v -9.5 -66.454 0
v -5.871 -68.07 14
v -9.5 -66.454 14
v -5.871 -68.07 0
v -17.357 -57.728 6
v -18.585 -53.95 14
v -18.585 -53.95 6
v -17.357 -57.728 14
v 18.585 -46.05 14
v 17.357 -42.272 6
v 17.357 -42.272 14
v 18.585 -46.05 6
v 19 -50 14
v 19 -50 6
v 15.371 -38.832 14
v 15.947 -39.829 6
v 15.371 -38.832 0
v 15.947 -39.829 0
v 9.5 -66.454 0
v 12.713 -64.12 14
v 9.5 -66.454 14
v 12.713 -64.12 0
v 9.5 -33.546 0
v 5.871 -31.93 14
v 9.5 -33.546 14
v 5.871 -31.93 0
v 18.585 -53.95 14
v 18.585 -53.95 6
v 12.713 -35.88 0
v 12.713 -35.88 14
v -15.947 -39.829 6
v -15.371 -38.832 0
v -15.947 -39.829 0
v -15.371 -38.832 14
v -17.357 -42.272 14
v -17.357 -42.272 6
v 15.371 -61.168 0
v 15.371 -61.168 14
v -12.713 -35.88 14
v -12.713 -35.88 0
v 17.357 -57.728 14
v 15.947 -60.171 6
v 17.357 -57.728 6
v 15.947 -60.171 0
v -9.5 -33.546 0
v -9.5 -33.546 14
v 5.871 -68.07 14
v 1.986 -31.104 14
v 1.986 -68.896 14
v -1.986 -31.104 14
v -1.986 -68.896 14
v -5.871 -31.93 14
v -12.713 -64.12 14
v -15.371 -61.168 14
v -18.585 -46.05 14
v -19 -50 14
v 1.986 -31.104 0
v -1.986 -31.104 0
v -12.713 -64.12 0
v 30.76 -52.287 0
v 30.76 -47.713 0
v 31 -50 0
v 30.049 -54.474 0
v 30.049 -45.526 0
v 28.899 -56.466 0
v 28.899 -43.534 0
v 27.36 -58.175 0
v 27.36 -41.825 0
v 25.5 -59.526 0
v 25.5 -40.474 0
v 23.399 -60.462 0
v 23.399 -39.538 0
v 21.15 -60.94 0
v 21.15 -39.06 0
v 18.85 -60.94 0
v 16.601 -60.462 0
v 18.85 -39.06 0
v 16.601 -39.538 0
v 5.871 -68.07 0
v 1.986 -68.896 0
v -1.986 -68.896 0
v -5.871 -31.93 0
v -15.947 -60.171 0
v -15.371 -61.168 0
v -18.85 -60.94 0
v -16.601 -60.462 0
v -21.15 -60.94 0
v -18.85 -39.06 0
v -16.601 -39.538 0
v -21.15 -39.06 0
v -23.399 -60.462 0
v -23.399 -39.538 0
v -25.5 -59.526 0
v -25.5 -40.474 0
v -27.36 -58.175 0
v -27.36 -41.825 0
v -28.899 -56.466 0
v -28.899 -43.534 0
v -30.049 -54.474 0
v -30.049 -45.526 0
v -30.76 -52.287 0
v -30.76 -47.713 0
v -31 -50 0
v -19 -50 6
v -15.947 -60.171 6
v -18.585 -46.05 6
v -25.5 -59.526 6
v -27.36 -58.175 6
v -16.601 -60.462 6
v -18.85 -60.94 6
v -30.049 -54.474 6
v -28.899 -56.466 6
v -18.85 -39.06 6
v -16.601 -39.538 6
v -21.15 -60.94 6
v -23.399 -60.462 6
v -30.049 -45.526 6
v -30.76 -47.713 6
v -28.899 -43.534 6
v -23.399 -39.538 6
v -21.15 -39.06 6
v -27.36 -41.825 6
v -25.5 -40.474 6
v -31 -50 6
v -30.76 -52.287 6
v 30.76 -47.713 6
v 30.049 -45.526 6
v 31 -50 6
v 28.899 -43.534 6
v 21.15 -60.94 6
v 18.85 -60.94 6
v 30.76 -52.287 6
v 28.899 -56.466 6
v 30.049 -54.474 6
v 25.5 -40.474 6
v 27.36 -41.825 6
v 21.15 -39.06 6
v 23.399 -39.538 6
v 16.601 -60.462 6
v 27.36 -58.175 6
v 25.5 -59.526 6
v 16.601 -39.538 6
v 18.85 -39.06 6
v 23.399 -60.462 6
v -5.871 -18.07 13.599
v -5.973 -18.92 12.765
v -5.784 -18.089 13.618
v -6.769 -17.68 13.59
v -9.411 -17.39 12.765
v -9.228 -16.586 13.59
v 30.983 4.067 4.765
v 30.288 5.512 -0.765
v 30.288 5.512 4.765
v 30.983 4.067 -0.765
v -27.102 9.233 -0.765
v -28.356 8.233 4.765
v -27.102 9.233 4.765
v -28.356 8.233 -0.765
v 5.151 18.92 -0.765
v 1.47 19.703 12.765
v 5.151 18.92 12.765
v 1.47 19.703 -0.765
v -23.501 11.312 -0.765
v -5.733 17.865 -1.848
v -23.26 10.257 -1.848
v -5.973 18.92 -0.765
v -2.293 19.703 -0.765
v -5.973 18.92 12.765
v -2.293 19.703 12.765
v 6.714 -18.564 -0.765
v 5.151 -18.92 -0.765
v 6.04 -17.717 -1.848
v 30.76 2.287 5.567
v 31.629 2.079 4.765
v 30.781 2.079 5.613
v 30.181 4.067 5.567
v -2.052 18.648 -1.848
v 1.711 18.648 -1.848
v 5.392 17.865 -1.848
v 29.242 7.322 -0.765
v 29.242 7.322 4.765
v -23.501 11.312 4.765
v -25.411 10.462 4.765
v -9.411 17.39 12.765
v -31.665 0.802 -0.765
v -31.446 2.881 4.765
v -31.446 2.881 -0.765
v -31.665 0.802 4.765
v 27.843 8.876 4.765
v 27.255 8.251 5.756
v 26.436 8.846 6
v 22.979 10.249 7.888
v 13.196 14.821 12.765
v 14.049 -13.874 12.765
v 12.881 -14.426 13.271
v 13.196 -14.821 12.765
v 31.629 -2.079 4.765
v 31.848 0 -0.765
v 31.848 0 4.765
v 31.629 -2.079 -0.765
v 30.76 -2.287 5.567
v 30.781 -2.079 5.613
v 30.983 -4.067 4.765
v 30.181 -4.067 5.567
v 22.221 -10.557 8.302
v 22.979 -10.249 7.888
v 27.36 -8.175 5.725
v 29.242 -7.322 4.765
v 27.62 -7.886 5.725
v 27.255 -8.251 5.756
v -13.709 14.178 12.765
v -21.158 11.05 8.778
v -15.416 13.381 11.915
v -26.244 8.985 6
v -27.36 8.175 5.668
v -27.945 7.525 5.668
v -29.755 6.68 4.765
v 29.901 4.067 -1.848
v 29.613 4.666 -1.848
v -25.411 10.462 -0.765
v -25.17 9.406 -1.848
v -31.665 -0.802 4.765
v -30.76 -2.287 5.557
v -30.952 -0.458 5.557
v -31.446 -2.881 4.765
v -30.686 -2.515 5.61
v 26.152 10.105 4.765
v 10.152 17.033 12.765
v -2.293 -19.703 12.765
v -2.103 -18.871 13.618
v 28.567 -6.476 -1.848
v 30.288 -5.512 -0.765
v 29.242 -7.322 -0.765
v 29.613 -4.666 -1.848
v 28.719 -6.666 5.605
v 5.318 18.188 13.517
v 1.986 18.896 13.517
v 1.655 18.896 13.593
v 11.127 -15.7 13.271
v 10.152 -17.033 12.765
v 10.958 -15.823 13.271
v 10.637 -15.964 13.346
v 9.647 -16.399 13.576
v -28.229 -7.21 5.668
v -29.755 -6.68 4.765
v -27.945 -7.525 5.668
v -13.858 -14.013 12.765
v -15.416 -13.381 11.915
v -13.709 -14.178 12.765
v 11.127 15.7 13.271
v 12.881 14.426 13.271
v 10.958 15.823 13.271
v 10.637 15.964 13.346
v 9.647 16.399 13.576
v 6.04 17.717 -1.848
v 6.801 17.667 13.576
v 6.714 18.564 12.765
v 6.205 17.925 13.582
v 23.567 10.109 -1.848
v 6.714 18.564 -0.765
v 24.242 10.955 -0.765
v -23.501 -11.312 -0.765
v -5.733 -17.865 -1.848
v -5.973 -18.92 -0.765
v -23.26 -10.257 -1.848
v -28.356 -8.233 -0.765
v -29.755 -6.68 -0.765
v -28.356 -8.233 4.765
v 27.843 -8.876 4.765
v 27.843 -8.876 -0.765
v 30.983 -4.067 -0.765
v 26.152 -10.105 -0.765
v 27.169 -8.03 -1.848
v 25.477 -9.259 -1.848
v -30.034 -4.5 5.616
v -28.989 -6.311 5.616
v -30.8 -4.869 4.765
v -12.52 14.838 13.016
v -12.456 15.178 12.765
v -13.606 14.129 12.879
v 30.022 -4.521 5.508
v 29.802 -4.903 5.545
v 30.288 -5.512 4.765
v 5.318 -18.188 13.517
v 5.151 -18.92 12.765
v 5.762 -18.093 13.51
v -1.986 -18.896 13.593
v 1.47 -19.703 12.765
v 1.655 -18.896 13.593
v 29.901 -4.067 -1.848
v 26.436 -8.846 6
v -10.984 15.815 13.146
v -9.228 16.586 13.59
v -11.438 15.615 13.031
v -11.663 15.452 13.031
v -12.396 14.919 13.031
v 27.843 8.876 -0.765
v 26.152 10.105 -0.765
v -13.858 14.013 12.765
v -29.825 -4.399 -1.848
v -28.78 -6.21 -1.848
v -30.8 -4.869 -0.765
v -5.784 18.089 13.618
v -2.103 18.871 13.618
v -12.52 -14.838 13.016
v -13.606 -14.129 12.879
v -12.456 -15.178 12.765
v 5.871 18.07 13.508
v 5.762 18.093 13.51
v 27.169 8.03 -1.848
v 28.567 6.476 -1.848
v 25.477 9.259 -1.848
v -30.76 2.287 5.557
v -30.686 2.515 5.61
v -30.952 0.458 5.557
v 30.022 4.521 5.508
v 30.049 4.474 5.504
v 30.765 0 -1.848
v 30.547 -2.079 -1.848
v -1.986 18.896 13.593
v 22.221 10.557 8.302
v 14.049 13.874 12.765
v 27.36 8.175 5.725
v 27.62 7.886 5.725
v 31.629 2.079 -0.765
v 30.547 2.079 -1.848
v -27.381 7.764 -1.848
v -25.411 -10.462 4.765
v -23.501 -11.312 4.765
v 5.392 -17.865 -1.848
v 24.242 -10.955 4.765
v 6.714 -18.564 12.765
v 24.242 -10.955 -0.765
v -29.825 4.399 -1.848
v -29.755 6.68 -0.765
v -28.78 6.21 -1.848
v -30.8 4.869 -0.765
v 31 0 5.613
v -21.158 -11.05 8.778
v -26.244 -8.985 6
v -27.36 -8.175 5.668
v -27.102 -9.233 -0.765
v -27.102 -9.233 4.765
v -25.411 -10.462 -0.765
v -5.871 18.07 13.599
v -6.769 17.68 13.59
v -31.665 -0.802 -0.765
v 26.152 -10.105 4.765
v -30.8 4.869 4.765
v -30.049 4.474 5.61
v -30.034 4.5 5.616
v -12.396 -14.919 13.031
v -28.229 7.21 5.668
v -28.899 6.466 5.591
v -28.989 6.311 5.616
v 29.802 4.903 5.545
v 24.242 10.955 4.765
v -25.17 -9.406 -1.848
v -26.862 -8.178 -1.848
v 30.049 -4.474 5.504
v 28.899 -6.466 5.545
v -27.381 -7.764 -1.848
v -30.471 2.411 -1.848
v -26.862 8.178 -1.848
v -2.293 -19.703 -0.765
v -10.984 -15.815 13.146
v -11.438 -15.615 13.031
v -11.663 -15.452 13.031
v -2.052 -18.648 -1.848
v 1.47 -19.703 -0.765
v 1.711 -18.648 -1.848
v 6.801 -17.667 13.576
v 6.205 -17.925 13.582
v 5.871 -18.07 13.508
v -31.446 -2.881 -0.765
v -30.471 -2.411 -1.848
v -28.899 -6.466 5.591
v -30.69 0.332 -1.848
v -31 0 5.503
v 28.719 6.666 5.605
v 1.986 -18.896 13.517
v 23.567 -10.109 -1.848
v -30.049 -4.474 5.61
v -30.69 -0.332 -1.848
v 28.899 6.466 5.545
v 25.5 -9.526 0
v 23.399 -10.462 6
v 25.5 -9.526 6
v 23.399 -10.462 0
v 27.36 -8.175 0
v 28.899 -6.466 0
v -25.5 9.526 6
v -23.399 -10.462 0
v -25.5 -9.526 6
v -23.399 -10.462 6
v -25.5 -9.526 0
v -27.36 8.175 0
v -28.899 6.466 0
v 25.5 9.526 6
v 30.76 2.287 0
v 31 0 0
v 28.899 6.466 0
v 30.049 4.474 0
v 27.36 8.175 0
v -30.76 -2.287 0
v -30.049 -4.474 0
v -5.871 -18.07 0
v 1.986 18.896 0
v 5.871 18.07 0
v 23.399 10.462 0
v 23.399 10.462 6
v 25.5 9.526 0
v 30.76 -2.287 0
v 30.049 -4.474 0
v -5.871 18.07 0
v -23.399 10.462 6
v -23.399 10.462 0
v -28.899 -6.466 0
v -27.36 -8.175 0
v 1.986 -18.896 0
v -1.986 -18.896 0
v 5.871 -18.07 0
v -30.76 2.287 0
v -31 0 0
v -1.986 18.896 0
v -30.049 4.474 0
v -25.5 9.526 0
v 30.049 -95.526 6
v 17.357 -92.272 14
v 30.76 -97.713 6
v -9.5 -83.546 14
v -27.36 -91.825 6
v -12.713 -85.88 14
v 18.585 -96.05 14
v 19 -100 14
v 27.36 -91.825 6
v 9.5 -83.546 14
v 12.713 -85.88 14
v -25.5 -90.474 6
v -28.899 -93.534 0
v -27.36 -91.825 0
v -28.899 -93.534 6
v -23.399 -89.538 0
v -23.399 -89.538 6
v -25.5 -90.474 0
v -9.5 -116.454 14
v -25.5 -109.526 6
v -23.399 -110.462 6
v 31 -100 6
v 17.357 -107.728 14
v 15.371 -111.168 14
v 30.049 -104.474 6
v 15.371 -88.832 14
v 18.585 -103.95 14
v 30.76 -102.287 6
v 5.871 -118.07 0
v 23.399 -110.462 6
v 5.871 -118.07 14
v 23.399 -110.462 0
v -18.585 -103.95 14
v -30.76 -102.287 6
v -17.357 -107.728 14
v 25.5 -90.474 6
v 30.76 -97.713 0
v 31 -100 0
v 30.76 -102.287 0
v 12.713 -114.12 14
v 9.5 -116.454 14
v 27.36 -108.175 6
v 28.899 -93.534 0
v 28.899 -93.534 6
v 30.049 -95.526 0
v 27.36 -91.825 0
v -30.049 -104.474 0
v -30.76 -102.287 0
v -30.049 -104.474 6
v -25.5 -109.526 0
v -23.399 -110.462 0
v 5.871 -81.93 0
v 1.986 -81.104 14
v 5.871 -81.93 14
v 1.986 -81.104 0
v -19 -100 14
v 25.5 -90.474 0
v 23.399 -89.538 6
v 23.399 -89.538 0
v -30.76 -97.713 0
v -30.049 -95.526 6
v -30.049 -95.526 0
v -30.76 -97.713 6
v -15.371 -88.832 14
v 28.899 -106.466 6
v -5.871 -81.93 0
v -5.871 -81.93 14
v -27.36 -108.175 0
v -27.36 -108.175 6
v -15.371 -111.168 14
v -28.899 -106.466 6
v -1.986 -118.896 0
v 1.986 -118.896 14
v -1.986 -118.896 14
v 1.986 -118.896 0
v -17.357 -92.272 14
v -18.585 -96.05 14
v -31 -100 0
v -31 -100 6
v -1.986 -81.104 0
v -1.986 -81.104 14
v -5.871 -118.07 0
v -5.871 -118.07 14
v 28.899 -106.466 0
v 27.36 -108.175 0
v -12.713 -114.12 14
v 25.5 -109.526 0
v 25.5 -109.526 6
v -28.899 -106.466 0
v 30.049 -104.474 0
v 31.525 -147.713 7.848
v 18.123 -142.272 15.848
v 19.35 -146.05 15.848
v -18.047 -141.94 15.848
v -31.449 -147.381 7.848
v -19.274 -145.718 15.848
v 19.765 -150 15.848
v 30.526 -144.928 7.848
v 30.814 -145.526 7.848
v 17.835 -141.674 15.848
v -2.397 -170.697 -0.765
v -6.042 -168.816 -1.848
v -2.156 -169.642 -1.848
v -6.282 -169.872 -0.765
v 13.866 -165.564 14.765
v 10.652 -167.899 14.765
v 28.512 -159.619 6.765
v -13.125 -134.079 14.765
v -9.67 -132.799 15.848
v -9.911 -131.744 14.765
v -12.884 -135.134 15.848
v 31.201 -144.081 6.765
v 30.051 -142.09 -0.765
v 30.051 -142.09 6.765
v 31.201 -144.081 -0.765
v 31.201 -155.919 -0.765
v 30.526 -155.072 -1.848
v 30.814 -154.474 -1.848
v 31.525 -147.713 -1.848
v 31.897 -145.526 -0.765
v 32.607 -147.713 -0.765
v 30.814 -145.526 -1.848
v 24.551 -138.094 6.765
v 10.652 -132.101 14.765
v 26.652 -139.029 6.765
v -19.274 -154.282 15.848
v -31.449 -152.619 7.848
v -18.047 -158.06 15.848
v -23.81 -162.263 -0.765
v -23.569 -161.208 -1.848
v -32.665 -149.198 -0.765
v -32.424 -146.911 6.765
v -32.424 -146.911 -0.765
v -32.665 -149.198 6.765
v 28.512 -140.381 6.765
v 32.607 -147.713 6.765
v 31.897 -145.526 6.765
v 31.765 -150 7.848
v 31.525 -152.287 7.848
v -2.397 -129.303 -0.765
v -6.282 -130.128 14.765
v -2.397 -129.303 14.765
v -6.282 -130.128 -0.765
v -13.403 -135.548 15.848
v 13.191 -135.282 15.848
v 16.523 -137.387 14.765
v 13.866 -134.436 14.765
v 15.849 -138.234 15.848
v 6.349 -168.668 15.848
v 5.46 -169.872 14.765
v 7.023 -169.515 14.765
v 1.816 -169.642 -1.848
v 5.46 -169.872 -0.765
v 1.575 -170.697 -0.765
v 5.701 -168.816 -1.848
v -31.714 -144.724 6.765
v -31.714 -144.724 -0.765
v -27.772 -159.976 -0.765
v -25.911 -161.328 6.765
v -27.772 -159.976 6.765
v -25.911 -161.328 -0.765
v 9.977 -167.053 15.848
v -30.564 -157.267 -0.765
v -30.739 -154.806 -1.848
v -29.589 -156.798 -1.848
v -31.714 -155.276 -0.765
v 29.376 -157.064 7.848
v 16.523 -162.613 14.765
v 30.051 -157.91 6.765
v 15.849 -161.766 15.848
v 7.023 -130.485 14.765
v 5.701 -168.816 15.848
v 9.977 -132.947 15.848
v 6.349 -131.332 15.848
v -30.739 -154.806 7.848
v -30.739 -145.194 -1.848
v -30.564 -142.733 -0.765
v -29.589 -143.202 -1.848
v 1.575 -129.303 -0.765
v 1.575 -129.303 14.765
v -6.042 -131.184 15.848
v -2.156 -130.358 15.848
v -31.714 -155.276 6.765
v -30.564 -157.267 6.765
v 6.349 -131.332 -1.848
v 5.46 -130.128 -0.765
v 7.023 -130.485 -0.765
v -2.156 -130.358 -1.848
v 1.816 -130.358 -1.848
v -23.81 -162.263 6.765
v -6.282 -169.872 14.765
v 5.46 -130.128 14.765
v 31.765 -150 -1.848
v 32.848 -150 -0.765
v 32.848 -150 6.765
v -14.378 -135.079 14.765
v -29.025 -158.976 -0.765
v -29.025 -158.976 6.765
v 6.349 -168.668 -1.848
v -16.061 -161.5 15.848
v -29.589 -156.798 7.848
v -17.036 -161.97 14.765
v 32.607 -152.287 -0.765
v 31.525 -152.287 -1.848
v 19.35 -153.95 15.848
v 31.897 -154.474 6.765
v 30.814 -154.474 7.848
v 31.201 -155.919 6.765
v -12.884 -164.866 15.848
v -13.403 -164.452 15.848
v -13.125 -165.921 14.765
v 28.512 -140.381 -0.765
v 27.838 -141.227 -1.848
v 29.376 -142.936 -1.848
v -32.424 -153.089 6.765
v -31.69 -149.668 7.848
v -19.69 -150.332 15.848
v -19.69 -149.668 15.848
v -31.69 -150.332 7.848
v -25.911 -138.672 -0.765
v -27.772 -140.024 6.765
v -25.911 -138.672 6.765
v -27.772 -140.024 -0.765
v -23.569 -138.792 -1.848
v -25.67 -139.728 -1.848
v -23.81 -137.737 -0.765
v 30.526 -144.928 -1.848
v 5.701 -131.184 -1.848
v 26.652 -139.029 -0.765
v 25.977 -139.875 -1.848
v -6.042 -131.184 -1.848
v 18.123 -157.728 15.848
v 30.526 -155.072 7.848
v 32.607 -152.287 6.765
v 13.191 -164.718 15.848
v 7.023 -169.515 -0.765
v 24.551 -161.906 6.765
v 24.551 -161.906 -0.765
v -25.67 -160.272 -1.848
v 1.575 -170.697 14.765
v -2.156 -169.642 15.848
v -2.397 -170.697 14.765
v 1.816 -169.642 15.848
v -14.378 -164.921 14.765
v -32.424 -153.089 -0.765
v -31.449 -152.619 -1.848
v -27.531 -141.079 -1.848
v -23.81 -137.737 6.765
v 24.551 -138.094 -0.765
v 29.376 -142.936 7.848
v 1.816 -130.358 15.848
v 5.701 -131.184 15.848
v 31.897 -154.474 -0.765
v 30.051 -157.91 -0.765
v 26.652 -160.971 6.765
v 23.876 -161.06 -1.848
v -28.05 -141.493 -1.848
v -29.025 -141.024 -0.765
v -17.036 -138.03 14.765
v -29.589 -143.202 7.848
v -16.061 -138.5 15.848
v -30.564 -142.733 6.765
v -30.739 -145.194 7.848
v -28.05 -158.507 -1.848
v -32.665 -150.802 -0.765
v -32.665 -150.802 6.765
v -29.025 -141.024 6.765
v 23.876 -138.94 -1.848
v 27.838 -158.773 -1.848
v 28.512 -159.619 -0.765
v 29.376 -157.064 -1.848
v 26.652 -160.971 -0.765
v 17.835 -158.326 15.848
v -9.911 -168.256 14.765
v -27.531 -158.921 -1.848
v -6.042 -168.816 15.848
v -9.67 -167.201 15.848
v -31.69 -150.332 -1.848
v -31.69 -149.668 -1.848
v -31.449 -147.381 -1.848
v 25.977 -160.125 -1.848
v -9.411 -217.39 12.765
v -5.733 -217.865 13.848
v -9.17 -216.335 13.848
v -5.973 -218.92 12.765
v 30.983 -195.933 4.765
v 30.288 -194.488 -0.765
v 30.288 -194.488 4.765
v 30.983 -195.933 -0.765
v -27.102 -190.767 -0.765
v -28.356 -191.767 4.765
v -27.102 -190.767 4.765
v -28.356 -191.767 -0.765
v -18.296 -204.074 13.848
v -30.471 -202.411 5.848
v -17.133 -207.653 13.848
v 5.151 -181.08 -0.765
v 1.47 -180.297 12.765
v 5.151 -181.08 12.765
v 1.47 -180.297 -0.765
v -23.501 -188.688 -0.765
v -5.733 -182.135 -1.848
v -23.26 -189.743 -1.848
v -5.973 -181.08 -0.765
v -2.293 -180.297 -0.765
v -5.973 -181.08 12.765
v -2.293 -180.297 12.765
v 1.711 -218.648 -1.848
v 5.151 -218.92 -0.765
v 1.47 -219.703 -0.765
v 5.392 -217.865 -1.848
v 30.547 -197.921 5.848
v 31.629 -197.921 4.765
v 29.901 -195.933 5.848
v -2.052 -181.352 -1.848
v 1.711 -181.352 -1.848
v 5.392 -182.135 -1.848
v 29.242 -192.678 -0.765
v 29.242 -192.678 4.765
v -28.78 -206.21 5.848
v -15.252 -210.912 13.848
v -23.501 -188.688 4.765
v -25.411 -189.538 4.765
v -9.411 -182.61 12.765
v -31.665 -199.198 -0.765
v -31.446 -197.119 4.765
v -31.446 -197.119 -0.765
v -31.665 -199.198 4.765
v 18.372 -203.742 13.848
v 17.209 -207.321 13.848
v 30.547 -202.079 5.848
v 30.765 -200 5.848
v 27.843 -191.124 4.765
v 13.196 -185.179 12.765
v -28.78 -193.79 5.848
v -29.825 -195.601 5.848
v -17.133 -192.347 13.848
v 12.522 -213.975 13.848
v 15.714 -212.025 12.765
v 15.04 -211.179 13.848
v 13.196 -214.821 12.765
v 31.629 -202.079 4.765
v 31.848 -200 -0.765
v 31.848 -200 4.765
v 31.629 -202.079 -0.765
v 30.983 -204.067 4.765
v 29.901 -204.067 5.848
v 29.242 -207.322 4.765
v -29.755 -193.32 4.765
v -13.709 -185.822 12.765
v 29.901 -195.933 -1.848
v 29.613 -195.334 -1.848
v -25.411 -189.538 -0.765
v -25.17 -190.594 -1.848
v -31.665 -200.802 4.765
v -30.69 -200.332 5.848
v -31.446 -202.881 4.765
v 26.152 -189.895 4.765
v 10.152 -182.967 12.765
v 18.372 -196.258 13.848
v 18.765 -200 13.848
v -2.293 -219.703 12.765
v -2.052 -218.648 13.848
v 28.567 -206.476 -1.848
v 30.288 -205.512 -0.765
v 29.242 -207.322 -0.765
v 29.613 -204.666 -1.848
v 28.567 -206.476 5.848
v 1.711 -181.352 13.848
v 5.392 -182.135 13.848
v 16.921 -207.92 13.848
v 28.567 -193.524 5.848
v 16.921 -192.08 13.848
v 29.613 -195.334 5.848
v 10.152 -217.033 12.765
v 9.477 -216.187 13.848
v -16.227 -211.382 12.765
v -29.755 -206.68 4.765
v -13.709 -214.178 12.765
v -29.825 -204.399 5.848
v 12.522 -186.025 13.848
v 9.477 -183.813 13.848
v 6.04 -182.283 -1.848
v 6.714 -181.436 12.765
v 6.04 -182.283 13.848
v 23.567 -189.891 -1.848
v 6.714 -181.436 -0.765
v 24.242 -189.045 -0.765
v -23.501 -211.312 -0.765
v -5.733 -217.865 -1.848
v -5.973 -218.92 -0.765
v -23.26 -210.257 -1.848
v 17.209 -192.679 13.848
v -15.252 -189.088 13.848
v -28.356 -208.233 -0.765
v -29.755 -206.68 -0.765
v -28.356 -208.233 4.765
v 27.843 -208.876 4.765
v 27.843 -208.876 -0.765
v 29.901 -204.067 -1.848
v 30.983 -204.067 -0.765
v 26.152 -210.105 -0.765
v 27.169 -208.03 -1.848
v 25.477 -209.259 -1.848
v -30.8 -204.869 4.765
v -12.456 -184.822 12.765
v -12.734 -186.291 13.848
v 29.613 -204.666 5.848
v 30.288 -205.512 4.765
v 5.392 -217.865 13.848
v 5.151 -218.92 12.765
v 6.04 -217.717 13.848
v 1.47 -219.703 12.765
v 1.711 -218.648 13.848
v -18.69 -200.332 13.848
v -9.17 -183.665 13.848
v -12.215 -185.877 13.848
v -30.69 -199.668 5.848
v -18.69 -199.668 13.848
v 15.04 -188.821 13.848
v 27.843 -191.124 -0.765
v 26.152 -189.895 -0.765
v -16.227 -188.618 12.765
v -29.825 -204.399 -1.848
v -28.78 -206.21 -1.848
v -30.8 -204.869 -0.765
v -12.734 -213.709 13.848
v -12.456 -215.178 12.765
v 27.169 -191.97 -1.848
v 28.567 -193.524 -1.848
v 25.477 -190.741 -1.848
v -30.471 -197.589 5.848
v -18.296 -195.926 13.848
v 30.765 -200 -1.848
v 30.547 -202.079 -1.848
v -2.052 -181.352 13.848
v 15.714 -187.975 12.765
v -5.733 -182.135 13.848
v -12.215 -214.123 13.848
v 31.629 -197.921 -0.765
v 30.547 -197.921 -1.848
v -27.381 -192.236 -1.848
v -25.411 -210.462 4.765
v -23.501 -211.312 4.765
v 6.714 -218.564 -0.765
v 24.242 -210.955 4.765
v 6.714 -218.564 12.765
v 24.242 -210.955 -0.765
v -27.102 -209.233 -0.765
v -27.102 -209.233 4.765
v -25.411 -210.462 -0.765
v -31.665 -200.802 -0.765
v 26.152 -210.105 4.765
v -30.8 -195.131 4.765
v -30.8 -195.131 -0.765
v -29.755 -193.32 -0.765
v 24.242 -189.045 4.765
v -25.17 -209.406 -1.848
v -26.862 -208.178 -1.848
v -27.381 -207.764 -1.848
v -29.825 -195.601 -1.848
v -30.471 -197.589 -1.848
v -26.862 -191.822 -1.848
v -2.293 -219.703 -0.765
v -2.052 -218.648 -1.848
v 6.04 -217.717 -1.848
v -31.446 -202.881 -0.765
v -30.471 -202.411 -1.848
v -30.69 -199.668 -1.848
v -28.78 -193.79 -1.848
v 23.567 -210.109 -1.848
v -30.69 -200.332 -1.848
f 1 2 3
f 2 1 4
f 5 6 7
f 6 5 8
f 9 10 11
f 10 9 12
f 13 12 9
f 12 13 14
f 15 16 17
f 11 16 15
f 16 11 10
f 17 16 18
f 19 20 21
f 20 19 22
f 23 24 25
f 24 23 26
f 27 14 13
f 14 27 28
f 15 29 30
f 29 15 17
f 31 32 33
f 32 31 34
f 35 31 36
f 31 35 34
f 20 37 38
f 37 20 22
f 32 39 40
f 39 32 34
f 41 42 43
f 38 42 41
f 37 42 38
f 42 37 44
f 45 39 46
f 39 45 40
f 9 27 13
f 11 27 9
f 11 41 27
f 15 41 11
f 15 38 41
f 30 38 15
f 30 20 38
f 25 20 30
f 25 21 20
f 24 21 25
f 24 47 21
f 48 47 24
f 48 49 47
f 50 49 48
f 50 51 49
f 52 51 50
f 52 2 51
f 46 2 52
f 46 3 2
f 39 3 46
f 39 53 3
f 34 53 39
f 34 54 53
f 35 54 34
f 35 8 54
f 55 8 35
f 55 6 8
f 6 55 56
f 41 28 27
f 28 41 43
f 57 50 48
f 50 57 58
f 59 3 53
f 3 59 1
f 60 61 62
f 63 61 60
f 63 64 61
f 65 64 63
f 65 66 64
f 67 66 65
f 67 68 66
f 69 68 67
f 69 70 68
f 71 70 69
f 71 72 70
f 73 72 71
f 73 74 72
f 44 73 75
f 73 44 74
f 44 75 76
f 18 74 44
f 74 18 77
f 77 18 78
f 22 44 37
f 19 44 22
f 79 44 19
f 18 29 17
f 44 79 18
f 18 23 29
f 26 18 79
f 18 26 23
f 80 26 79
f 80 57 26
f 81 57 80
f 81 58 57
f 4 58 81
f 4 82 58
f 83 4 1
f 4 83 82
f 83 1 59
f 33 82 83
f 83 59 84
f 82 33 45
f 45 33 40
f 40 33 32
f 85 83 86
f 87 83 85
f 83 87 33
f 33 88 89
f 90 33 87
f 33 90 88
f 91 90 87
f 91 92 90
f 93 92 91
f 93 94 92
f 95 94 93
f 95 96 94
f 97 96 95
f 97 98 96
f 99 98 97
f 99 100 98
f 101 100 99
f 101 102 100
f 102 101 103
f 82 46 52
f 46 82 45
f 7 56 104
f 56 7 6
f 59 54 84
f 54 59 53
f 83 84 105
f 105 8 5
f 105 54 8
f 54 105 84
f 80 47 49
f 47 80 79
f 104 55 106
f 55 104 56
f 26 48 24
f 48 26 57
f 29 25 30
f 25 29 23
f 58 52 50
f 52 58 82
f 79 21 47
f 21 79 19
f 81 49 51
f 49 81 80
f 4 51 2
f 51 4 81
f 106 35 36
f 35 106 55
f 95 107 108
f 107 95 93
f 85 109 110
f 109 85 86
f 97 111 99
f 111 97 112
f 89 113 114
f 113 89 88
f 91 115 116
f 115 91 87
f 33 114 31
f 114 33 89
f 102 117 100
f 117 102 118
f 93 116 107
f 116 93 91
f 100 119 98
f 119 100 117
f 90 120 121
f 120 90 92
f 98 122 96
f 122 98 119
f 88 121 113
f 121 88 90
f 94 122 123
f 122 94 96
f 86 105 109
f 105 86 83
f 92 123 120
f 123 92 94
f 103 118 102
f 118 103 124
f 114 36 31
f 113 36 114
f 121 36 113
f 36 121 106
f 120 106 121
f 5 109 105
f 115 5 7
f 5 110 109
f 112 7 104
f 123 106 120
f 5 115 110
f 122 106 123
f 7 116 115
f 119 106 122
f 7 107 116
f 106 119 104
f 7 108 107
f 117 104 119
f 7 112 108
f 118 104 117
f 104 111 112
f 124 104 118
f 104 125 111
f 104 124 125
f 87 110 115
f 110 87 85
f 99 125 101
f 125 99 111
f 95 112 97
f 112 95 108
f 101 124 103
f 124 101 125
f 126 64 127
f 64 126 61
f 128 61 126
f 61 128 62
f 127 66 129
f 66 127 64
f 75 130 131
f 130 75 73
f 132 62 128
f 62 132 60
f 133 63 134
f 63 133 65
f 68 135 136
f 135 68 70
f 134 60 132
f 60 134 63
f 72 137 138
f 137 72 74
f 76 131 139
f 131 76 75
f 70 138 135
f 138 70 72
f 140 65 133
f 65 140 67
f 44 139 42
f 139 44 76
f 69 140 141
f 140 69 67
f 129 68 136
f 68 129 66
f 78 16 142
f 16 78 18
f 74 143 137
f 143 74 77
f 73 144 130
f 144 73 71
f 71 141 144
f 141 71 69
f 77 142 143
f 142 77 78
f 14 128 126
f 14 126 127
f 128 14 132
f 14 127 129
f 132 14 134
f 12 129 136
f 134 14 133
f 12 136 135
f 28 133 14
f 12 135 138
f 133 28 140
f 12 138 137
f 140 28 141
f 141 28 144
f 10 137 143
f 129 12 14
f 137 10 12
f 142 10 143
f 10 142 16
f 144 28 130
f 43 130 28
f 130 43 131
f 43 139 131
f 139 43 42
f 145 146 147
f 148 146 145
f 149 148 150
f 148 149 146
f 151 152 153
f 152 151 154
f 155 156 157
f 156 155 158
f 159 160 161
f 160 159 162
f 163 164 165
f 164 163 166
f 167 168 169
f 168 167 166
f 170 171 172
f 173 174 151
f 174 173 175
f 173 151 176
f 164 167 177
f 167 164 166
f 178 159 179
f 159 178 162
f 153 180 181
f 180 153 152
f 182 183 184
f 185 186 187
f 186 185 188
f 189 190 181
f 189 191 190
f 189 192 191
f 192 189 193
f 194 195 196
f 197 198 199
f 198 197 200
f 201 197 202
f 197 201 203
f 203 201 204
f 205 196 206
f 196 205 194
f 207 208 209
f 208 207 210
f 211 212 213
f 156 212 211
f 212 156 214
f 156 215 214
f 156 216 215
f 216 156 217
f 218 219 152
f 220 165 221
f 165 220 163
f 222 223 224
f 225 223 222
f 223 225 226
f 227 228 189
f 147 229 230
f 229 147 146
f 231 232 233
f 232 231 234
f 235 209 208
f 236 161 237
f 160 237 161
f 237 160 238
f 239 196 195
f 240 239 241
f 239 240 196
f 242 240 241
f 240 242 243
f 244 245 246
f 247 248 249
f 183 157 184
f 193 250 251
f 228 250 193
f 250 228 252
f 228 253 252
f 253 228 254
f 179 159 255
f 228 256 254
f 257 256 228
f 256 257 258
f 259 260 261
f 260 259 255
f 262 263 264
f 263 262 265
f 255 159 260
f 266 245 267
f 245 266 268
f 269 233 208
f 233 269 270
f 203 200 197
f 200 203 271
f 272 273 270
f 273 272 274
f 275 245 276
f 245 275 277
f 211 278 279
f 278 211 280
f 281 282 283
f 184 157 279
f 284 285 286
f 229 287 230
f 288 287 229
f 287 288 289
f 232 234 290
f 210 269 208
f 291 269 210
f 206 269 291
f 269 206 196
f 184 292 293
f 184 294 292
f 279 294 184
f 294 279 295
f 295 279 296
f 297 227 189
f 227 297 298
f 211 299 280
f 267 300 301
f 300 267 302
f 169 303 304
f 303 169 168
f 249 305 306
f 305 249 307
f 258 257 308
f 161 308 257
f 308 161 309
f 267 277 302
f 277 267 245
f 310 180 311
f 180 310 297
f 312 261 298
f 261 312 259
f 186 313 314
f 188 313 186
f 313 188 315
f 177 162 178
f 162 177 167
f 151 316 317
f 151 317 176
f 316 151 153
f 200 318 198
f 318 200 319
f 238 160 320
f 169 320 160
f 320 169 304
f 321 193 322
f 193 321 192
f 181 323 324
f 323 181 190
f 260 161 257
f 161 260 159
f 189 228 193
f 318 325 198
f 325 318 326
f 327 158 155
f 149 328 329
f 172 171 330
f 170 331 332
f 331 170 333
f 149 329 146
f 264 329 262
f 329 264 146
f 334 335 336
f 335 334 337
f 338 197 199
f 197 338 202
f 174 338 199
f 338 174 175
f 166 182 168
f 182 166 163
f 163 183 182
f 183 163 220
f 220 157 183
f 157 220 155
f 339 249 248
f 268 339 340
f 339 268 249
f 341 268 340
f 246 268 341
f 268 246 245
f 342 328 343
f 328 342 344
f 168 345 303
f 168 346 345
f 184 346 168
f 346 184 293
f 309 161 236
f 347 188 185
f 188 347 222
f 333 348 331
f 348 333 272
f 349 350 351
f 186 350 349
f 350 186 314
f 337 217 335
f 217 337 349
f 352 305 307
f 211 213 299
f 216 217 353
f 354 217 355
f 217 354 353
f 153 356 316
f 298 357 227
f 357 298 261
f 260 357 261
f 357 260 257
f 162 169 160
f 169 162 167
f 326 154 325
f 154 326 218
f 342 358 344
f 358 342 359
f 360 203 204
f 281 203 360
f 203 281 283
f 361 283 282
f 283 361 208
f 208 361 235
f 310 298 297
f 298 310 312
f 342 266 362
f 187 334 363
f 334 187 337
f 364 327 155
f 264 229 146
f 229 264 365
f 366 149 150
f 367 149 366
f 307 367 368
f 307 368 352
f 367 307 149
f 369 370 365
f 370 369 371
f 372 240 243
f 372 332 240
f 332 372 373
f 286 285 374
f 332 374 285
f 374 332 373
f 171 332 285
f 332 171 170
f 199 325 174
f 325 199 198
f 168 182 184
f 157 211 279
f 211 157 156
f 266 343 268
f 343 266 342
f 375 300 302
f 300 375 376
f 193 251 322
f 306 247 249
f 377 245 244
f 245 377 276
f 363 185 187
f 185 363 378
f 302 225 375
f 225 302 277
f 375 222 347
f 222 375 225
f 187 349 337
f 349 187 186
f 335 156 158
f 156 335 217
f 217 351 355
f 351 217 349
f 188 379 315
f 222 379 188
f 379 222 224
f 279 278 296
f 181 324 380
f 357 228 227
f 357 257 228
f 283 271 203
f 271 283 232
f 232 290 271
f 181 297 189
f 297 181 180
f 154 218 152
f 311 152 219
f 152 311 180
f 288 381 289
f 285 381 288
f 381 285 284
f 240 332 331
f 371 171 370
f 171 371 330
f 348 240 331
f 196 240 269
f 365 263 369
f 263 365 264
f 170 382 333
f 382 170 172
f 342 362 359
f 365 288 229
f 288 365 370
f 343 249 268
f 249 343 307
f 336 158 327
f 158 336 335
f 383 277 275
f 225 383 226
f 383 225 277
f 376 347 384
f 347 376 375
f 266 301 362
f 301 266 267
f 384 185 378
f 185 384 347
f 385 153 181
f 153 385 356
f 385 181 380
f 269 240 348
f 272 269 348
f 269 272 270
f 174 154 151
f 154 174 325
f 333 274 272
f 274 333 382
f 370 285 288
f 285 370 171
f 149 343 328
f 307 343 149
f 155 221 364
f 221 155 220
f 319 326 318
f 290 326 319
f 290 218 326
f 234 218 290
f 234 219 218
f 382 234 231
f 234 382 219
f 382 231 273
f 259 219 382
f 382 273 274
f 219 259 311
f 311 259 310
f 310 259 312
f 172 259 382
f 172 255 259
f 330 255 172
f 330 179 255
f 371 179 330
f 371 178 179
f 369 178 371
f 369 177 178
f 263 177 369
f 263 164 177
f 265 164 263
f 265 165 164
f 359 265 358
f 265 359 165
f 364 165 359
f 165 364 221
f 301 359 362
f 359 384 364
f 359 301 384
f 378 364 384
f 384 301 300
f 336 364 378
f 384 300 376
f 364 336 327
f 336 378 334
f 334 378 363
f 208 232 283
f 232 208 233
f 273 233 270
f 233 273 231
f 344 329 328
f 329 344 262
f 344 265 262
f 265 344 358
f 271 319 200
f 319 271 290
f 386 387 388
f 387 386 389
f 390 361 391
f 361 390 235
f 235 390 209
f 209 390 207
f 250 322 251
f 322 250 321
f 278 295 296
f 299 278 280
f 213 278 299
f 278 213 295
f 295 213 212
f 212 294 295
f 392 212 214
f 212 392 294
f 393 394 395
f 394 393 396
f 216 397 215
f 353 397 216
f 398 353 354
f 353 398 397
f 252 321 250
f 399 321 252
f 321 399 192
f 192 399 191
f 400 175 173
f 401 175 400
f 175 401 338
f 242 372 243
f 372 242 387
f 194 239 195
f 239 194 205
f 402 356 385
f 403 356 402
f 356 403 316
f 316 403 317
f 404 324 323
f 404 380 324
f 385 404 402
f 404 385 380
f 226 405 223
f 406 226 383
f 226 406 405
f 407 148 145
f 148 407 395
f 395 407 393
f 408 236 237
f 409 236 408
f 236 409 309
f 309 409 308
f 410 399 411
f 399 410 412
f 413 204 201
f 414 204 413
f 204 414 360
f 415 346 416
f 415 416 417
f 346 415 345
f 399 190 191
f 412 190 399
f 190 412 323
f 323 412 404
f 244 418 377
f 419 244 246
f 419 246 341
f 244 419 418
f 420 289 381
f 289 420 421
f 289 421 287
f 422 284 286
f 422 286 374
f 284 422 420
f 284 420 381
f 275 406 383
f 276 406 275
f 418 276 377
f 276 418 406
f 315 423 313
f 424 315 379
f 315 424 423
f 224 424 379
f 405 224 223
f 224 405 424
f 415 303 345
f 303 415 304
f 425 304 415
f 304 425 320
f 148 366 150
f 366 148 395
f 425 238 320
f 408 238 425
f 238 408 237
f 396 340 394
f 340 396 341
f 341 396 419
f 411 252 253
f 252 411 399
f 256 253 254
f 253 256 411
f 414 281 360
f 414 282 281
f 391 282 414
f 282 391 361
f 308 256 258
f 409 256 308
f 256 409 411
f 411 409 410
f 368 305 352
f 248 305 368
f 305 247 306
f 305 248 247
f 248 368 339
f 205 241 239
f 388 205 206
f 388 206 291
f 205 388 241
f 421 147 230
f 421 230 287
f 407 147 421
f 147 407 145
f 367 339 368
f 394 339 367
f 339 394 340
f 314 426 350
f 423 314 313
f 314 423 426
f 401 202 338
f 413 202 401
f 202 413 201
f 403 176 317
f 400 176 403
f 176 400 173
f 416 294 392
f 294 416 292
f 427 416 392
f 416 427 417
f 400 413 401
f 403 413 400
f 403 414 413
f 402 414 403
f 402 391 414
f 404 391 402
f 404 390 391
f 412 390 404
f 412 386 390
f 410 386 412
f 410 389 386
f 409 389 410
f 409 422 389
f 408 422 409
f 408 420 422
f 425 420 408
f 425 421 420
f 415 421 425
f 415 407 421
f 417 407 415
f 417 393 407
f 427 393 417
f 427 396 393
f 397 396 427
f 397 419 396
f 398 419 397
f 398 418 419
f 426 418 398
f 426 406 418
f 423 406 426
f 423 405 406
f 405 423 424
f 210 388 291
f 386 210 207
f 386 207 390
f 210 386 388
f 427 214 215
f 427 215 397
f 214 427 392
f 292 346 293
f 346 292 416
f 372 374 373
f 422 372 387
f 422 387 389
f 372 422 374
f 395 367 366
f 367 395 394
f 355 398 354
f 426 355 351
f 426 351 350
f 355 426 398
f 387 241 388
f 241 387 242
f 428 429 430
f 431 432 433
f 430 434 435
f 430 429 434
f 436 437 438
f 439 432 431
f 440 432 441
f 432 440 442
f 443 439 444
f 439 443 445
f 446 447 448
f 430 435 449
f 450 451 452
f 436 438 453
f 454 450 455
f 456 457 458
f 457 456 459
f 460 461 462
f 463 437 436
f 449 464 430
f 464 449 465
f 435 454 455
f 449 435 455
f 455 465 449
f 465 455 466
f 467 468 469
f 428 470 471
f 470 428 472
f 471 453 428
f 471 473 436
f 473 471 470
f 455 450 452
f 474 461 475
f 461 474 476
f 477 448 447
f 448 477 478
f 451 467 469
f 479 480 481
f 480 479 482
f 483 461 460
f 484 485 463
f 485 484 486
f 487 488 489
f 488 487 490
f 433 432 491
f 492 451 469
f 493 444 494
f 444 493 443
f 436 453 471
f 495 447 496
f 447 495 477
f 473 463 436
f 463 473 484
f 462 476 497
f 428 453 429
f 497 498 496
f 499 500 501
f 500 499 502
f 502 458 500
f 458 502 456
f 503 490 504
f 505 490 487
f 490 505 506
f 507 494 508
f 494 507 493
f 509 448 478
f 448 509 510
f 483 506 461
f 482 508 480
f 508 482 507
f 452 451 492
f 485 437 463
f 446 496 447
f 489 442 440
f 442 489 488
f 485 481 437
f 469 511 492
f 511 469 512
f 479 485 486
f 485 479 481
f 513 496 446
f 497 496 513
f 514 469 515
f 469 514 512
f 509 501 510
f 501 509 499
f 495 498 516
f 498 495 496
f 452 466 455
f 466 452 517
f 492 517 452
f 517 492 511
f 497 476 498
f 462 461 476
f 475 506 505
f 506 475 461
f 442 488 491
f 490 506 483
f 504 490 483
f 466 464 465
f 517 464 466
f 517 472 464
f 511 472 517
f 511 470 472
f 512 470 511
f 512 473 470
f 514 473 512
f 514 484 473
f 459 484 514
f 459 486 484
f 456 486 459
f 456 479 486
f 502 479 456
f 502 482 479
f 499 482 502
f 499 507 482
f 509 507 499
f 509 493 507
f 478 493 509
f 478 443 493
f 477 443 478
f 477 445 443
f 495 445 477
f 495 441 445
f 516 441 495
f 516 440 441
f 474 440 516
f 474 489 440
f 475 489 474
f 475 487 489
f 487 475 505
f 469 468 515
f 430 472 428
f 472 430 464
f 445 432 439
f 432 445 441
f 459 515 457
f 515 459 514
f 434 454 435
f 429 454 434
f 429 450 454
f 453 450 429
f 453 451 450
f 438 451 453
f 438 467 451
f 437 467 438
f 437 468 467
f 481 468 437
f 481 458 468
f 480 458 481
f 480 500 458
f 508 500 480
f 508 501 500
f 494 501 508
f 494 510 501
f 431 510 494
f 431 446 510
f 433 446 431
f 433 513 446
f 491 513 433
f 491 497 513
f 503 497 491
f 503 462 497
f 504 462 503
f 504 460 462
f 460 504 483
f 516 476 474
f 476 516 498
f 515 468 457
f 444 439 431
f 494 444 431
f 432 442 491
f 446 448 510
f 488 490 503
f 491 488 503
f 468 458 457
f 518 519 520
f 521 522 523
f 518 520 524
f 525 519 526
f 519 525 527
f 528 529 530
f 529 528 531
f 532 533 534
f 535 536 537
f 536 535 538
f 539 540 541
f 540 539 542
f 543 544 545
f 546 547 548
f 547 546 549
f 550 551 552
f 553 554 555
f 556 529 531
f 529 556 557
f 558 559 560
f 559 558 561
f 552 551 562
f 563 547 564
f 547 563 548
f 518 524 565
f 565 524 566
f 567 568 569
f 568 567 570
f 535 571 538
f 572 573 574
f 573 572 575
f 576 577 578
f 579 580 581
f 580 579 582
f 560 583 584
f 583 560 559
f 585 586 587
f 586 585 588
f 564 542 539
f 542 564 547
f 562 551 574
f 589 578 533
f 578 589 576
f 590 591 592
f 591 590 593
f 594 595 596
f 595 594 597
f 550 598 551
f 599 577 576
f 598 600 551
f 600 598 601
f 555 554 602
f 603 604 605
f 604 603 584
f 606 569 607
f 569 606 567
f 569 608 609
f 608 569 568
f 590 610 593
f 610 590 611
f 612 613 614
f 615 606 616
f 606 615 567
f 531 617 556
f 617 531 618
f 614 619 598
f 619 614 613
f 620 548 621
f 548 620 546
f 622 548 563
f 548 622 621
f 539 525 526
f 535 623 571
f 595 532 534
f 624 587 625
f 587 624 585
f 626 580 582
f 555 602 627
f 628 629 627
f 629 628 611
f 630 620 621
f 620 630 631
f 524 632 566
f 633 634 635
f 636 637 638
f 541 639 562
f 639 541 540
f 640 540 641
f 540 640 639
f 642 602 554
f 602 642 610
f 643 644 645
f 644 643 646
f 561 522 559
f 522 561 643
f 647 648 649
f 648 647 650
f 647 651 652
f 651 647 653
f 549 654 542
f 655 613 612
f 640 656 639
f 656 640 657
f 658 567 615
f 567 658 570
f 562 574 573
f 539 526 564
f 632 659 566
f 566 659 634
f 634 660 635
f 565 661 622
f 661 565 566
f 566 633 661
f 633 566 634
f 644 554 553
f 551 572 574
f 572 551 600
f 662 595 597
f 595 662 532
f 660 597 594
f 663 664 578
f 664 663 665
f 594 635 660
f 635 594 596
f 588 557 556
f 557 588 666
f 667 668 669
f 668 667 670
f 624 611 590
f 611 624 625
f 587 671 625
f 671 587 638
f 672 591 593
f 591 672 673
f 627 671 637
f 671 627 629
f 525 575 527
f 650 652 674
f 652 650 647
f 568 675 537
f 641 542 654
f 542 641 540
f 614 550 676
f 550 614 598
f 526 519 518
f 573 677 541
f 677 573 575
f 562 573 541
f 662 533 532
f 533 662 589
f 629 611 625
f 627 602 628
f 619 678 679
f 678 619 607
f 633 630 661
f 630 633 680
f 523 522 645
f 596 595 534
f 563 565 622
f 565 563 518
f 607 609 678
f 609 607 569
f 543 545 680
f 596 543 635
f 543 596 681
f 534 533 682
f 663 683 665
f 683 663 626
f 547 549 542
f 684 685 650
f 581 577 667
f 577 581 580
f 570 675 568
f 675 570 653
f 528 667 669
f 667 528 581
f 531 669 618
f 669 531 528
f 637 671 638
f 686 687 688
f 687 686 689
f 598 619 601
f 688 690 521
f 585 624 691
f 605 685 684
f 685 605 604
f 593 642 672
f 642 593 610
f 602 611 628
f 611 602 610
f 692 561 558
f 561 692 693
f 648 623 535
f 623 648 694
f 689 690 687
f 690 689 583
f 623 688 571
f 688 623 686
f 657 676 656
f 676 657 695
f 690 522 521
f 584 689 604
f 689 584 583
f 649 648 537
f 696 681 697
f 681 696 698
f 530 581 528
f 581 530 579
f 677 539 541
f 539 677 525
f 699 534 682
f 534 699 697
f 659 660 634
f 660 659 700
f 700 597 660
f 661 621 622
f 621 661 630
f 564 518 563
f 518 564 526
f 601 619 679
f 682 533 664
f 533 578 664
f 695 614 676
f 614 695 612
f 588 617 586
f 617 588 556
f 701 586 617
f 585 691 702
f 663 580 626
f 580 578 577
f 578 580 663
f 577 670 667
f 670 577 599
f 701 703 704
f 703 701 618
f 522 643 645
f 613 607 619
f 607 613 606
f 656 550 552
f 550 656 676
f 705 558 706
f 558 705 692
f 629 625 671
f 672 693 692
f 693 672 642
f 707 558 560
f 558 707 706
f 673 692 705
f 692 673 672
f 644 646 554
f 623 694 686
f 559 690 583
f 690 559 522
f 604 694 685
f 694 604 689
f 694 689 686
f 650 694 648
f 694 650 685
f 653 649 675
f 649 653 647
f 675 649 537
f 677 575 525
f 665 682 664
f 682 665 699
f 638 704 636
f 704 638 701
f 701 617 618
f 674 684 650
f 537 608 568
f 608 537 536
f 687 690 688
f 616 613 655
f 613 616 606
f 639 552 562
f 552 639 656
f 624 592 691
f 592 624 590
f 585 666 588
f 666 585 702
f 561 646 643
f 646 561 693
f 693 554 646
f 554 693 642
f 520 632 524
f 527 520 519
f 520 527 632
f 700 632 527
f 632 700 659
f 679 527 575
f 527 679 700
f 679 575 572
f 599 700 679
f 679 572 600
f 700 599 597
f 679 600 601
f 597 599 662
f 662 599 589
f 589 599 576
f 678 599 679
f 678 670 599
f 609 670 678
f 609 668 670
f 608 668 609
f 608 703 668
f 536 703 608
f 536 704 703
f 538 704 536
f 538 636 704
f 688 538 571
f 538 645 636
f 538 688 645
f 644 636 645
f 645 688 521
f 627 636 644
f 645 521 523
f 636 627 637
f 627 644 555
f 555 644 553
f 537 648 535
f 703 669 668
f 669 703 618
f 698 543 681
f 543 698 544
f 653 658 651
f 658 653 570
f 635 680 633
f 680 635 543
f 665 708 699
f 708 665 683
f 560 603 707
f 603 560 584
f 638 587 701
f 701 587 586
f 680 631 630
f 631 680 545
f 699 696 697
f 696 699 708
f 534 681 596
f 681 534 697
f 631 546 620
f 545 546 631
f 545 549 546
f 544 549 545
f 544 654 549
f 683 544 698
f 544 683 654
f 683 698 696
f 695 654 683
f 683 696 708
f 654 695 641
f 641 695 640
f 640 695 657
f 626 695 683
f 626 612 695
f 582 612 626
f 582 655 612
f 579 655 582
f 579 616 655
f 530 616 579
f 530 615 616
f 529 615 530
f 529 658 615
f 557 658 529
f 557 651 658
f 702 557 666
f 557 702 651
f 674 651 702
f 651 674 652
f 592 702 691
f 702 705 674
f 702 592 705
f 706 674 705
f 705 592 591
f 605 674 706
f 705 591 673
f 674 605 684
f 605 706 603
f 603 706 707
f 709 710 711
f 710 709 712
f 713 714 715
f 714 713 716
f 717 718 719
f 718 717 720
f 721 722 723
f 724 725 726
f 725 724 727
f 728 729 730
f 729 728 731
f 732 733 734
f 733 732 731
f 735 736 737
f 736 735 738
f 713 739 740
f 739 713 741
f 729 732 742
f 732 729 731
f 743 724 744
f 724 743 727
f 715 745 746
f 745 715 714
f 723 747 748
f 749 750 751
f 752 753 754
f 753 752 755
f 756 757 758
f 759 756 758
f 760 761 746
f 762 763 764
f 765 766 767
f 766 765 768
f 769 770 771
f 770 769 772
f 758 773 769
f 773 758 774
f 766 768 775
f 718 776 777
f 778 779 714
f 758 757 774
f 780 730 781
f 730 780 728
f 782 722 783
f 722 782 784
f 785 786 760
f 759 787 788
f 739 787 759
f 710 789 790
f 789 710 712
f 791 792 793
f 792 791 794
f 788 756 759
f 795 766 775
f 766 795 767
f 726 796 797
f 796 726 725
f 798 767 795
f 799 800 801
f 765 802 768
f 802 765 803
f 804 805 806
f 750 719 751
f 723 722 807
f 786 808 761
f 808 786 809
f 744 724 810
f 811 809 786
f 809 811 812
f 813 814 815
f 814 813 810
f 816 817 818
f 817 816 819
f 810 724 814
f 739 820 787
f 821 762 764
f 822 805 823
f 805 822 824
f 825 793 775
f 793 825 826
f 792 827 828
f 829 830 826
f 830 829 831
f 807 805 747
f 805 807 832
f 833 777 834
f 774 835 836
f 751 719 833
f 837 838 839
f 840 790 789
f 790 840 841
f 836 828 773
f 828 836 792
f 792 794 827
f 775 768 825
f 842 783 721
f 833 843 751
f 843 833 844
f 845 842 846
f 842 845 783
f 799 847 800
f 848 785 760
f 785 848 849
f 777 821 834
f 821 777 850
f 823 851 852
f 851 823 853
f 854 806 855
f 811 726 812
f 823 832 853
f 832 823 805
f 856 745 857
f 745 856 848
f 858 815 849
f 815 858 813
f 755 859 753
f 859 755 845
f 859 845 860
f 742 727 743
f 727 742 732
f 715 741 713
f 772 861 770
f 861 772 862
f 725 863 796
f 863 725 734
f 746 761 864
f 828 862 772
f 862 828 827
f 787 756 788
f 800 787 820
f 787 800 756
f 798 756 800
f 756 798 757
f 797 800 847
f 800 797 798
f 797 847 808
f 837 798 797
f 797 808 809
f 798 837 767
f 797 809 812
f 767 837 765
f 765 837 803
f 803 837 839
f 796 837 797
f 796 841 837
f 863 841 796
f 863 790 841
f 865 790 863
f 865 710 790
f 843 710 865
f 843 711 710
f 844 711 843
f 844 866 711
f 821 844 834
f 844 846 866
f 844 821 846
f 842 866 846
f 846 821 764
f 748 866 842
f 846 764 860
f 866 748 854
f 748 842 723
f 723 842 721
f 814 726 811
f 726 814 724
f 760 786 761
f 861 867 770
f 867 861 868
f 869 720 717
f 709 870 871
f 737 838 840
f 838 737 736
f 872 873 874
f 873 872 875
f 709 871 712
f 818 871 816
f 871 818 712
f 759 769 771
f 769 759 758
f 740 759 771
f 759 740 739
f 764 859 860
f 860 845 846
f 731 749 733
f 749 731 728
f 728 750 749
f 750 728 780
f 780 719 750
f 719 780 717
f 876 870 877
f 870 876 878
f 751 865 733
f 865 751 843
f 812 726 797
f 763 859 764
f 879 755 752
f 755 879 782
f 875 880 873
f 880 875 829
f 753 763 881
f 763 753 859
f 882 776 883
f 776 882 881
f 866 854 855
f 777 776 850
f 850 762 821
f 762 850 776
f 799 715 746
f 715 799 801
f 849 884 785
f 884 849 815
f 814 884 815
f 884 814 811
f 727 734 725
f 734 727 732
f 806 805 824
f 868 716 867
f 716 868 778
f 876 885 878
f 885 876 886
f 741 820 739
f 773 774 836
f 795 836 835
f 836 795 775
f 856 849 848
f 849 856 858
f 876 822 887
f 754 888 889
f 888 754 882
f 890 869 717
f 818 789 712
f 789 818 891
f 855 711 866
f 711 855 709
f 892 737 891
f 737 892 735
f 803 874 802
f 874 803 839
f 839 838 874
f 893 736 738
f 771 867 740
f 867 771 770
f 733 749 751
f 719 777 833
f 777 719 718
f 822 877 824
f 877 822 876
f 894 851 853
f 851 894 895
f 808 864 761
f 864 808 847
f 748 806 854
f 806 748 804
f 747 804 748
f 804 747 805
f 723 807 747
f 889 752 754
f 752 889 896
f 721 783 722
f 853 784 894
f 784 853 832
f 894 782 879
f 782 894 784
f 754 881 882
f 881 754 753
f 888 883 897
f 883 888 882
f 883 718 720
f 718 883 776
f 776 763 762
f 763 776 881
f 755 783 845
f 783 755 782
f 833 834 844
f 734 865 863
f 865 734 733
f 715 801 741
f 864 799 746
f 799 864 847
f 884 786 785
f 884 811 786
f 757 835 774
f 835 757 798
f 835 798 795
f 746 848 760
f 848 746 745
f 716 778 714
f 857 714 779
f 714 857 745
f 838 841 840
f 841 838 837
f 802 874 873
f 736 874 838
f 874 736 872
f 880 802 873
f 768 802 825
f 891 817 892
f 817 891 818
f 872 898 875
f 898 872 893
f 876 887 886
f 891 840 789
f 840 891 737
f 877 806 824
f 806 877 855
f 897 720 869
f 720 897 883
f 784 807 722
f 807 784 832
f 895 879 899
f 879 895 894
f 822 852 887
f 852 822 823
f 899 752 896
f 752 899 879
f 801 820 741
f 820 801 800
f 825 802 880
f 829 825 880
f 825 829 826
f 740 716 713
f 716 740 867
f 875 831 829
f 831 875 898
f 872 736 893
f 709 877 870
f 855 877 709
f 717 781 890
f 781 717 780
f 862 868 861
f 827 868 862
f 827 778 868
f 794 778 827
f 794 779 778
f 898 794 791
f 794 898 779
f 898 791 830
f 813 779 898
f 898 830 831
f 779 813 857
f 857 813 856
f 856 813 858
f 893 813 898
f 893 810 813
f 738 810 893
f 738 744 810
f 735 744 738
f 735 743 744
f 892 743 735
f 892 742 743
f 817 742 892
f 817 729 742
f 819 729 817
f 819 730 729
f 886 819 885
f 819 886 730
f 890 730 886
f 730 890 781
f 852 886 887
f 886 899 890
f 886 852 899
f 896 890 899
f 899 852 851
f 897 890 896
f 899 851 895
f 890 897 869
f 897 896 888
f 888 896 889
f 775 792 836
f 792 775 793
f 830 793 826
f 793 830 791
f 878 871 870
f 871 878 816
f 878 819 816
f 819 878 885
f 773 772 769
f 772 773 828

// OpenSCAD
module body() {
    // normal body that's easy to grip
    minkowski() {
        sphere(2);
        hull() {
            cylinder(d=38,hh-2);
            translate([-20,0,0]) cylinder(d=22,6);
            translate([20,0,0]) cylinder(d=22,6);
        }
    }
}


module t1() {
    cylinder(d=38,h=14);
}
module t2() {
    cylinder(d=38,h=14);
    translate([-20,0,0]) cylinder(d=22,6);
    translate([20,0,0]) cylinder(d=22,6);
}
module t3() {
    hull() {
        cylinder(d=38,h=14);
        translate([-20,0,0]) cylinder(d=22,6);
        translate([20,0,0]) cylinder(d=22,6);
    }
}

module t4() {
    minkowski() {
        sphere(2);
        hull() {
            cylinder(d=38,h=14);
            translate([-20,0,0]) cylinder(d=22,6);
            translate([20,0,0]) cylinder(d=22,6);
        }
    }
}

module t5() {
    round=2;
    minkowski() {
        sphere(round);
        hull() {
            cylinder(d=38-round,h=14-round);
            translate([-20,0,0]) cylinder(d=22-round,6-round);
            translate([20,0,0]) cylinder(d=22-round,6-round);
        }
    }
}


// t1();
translate([0,-50,0]) t2();
translate([0,-100,0]) t3();
translate([0,-150,0]) t4();
translate([0,-200,0]) t5();

difference() { t5(); t3(); }
